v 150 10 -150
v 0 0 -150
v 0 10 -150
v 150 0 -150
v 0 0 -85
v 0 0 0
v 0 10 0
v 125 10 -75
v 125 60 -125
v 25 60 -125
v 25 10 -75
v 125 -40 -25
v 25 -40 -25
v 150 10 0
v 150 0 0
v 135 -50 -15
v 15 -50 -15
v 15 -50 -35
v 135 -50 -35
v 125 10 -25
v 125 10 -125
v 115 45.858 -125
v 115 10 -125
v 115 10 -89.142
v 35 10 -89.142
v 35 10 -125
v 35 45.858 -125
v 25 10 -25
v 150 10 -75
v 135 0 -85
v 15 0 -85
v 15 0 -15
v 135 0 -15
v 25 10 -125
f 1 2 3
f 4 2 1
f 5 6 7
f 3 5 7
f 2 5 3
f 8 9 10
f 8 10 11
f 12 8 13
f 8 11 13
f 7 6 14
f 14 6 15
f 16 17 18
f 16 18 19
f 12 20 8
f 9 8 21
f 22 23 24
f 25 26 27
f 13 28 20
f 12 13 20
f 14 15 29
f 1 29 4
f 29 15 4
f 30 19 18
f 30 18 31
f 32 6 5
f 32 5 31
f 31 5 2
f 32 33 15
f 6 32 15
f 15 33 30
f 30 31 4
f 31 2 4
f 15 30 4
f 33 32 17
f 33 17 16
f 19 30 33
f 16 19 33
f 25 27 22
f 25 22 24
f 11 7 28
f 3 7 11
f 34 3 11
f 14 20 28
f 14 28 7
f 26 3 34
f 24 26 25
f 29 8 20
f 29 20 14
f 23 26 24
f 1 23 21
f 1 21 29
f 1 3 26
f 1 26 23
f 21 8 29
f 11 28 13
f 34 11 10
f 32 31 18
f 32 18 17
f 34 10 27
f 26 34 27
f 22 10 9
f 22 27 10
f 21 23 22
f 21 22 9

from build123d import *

# Parameters (mm, degrees)
SKETCH1_W           = 150
SKETCH1_H           = 150
BOSS_EXTRUDE1_DEPTH = 10
SKETCH3_W           = 100
SKETCH3_H           = 50
BOSS_EXTRUDE2_DEPTH = 50
CUT_EXTRUDE1_DEPTH  = 205.266982158
SKETCH5_W           = 100
SKETCH5_H           = 50
CUT_EXTRUDE2_DEPTH  = 218.944947177
SKETCH7_W           = 120
SKETCH7_H           = 70
BOSS_EXTRUDE6_DEPTH = 50
BOSS_EXTRUDE7_DEPTH = 100
SKETCH9_W           = 100
SKETCH9_H           = 40
CUT_EXTRUDE4_DEPTH  = 40
BOSS_EXTRUDE8_DEPTH = 100
CUT_EXTRUDE5_DEPTH  = 211.535032714
SHELL1_START        = 35
SHELL1_DEPTH        = 80


# Read off the part's stored shape, not the designer's step: Shell1
with BuildPart() as part:
    # Sketch1 → Boss-Extrude1 (new body)
    with BuildSketch(Plane(origin=(0, 0, 0), x_dir=(1, 0, 0), z_dir=(0, 1, 0))):
        with Locations((75, 75)):
            Rectangle(SKETCH1_W, SKETCH1_H)
    extrude(amount=BOSS_EXTRUDE1_DEPTH)

    # Sketch3 → Boss-Extrude2 (add)
    with BuildSketch(Plane(origin=(0, 10, 0), x_dir=(1, 0, 0), z_dir=(0, 1, 0))):
        with Locations((75, 100)):
            Rectangle(SKETCH3_W, SKETCH3_H)
    extrude(amount=BOSS_EXTRUDE2_DEPTH)

    # Sketch4 → Cut-Extrude1 (cut, through all)
    with BuildSketch(Plane.ZY.offset(-25)):
        Polygon((-125, 60), (-75, 10), (-75, 60), align=None)
    extrude(amount=-CUT_EXTRUDE1_DEPTH, mode=Mode.SUBTRACT)

    # Sketch5 → Cut-Extrude2 (cut, through all)
    with BuildSketch(Plane(origin=(0, 10, 0), x_dir=(1, 0, 0), z_dir=(0, 1, 0))):
        with Locations((75, 50)):
            Rectangle(SKETCH5_W, SKETCH5_H)
    extrude(amount=-CUT_EXTRUDE2_DEPTH, mode=Mode.SUBTRACT)

    # Sketch7 → Boss-Extrude6 (add)
    with BuildSketch(Plane.XZ):
        with Locations((75, -50)):
            Rectangle(SKETCH7_W, SKETCH7_H)
    extrude(amount=BOSS_EXTRUDE6_DEPTH)

    # Sketch6 → Boss-Extrude7 (add)
    with BuildSketch(Plane(origin=(25, 0, 0), x_dir=(0, 0, -1), z_dir=(1, 0, 0))):
        Polygon((75, 0), (75, 10), (65, 0), align=None)
    extrude(amount=BOSS_EXTRUDE7_DEPTH)

    # Sketch9 → Cut-Extrude4 (cut)
    with BuildSketch(Plane(origin=(0, 0, 0), x_dir=(1, 0, 0), z_dir=(0, 1, 0))):
        with Locations((75, 45)):
            Rectangle(SKETCH9_W, SKETCH9_H)
    extrude(amount=-CUT_EXTRUDE4_DEPTH, mode=Mode.SUBTRACT)

    # Sketch10 → Boss-Extrude8 (add)
    with BuildSketch(Plane(origin=(25, 0, 0), x_dir=(0, 0, -1), z_dir=(1, 0, 0))):
        Polygon((65, 0), (25, -40), (65, -40), align=None)
    extrude(amount=BOSS_EXTRUDE8_DEPTH)

    # Sketch11 → Cut-Extrude5 (cut, through all)
    with BuildSketch(Plane(origin=(135, 0, 0), x_dir=(0, 0, -1), z_dir=(1, 0, 0))):
        Polygon((85, 0), (85, -50), (35, -50), align=None)
    extrude(amount=-CUT_EXTRUDE5_DEPTH, mode=Mode.SUBTRACT)

    # Shell1 outline → Shell1 (cut)
    with BuildSketch(Plane.YZ.offset(SHELL1_START)):
        Polygon((45.857864376, -125), (10, -89.142135624), (10, -125), align=None)
    extrude(amount=SHELL1_DEPTH, mode=Mode.SUBTRACT)


solid = part.part
